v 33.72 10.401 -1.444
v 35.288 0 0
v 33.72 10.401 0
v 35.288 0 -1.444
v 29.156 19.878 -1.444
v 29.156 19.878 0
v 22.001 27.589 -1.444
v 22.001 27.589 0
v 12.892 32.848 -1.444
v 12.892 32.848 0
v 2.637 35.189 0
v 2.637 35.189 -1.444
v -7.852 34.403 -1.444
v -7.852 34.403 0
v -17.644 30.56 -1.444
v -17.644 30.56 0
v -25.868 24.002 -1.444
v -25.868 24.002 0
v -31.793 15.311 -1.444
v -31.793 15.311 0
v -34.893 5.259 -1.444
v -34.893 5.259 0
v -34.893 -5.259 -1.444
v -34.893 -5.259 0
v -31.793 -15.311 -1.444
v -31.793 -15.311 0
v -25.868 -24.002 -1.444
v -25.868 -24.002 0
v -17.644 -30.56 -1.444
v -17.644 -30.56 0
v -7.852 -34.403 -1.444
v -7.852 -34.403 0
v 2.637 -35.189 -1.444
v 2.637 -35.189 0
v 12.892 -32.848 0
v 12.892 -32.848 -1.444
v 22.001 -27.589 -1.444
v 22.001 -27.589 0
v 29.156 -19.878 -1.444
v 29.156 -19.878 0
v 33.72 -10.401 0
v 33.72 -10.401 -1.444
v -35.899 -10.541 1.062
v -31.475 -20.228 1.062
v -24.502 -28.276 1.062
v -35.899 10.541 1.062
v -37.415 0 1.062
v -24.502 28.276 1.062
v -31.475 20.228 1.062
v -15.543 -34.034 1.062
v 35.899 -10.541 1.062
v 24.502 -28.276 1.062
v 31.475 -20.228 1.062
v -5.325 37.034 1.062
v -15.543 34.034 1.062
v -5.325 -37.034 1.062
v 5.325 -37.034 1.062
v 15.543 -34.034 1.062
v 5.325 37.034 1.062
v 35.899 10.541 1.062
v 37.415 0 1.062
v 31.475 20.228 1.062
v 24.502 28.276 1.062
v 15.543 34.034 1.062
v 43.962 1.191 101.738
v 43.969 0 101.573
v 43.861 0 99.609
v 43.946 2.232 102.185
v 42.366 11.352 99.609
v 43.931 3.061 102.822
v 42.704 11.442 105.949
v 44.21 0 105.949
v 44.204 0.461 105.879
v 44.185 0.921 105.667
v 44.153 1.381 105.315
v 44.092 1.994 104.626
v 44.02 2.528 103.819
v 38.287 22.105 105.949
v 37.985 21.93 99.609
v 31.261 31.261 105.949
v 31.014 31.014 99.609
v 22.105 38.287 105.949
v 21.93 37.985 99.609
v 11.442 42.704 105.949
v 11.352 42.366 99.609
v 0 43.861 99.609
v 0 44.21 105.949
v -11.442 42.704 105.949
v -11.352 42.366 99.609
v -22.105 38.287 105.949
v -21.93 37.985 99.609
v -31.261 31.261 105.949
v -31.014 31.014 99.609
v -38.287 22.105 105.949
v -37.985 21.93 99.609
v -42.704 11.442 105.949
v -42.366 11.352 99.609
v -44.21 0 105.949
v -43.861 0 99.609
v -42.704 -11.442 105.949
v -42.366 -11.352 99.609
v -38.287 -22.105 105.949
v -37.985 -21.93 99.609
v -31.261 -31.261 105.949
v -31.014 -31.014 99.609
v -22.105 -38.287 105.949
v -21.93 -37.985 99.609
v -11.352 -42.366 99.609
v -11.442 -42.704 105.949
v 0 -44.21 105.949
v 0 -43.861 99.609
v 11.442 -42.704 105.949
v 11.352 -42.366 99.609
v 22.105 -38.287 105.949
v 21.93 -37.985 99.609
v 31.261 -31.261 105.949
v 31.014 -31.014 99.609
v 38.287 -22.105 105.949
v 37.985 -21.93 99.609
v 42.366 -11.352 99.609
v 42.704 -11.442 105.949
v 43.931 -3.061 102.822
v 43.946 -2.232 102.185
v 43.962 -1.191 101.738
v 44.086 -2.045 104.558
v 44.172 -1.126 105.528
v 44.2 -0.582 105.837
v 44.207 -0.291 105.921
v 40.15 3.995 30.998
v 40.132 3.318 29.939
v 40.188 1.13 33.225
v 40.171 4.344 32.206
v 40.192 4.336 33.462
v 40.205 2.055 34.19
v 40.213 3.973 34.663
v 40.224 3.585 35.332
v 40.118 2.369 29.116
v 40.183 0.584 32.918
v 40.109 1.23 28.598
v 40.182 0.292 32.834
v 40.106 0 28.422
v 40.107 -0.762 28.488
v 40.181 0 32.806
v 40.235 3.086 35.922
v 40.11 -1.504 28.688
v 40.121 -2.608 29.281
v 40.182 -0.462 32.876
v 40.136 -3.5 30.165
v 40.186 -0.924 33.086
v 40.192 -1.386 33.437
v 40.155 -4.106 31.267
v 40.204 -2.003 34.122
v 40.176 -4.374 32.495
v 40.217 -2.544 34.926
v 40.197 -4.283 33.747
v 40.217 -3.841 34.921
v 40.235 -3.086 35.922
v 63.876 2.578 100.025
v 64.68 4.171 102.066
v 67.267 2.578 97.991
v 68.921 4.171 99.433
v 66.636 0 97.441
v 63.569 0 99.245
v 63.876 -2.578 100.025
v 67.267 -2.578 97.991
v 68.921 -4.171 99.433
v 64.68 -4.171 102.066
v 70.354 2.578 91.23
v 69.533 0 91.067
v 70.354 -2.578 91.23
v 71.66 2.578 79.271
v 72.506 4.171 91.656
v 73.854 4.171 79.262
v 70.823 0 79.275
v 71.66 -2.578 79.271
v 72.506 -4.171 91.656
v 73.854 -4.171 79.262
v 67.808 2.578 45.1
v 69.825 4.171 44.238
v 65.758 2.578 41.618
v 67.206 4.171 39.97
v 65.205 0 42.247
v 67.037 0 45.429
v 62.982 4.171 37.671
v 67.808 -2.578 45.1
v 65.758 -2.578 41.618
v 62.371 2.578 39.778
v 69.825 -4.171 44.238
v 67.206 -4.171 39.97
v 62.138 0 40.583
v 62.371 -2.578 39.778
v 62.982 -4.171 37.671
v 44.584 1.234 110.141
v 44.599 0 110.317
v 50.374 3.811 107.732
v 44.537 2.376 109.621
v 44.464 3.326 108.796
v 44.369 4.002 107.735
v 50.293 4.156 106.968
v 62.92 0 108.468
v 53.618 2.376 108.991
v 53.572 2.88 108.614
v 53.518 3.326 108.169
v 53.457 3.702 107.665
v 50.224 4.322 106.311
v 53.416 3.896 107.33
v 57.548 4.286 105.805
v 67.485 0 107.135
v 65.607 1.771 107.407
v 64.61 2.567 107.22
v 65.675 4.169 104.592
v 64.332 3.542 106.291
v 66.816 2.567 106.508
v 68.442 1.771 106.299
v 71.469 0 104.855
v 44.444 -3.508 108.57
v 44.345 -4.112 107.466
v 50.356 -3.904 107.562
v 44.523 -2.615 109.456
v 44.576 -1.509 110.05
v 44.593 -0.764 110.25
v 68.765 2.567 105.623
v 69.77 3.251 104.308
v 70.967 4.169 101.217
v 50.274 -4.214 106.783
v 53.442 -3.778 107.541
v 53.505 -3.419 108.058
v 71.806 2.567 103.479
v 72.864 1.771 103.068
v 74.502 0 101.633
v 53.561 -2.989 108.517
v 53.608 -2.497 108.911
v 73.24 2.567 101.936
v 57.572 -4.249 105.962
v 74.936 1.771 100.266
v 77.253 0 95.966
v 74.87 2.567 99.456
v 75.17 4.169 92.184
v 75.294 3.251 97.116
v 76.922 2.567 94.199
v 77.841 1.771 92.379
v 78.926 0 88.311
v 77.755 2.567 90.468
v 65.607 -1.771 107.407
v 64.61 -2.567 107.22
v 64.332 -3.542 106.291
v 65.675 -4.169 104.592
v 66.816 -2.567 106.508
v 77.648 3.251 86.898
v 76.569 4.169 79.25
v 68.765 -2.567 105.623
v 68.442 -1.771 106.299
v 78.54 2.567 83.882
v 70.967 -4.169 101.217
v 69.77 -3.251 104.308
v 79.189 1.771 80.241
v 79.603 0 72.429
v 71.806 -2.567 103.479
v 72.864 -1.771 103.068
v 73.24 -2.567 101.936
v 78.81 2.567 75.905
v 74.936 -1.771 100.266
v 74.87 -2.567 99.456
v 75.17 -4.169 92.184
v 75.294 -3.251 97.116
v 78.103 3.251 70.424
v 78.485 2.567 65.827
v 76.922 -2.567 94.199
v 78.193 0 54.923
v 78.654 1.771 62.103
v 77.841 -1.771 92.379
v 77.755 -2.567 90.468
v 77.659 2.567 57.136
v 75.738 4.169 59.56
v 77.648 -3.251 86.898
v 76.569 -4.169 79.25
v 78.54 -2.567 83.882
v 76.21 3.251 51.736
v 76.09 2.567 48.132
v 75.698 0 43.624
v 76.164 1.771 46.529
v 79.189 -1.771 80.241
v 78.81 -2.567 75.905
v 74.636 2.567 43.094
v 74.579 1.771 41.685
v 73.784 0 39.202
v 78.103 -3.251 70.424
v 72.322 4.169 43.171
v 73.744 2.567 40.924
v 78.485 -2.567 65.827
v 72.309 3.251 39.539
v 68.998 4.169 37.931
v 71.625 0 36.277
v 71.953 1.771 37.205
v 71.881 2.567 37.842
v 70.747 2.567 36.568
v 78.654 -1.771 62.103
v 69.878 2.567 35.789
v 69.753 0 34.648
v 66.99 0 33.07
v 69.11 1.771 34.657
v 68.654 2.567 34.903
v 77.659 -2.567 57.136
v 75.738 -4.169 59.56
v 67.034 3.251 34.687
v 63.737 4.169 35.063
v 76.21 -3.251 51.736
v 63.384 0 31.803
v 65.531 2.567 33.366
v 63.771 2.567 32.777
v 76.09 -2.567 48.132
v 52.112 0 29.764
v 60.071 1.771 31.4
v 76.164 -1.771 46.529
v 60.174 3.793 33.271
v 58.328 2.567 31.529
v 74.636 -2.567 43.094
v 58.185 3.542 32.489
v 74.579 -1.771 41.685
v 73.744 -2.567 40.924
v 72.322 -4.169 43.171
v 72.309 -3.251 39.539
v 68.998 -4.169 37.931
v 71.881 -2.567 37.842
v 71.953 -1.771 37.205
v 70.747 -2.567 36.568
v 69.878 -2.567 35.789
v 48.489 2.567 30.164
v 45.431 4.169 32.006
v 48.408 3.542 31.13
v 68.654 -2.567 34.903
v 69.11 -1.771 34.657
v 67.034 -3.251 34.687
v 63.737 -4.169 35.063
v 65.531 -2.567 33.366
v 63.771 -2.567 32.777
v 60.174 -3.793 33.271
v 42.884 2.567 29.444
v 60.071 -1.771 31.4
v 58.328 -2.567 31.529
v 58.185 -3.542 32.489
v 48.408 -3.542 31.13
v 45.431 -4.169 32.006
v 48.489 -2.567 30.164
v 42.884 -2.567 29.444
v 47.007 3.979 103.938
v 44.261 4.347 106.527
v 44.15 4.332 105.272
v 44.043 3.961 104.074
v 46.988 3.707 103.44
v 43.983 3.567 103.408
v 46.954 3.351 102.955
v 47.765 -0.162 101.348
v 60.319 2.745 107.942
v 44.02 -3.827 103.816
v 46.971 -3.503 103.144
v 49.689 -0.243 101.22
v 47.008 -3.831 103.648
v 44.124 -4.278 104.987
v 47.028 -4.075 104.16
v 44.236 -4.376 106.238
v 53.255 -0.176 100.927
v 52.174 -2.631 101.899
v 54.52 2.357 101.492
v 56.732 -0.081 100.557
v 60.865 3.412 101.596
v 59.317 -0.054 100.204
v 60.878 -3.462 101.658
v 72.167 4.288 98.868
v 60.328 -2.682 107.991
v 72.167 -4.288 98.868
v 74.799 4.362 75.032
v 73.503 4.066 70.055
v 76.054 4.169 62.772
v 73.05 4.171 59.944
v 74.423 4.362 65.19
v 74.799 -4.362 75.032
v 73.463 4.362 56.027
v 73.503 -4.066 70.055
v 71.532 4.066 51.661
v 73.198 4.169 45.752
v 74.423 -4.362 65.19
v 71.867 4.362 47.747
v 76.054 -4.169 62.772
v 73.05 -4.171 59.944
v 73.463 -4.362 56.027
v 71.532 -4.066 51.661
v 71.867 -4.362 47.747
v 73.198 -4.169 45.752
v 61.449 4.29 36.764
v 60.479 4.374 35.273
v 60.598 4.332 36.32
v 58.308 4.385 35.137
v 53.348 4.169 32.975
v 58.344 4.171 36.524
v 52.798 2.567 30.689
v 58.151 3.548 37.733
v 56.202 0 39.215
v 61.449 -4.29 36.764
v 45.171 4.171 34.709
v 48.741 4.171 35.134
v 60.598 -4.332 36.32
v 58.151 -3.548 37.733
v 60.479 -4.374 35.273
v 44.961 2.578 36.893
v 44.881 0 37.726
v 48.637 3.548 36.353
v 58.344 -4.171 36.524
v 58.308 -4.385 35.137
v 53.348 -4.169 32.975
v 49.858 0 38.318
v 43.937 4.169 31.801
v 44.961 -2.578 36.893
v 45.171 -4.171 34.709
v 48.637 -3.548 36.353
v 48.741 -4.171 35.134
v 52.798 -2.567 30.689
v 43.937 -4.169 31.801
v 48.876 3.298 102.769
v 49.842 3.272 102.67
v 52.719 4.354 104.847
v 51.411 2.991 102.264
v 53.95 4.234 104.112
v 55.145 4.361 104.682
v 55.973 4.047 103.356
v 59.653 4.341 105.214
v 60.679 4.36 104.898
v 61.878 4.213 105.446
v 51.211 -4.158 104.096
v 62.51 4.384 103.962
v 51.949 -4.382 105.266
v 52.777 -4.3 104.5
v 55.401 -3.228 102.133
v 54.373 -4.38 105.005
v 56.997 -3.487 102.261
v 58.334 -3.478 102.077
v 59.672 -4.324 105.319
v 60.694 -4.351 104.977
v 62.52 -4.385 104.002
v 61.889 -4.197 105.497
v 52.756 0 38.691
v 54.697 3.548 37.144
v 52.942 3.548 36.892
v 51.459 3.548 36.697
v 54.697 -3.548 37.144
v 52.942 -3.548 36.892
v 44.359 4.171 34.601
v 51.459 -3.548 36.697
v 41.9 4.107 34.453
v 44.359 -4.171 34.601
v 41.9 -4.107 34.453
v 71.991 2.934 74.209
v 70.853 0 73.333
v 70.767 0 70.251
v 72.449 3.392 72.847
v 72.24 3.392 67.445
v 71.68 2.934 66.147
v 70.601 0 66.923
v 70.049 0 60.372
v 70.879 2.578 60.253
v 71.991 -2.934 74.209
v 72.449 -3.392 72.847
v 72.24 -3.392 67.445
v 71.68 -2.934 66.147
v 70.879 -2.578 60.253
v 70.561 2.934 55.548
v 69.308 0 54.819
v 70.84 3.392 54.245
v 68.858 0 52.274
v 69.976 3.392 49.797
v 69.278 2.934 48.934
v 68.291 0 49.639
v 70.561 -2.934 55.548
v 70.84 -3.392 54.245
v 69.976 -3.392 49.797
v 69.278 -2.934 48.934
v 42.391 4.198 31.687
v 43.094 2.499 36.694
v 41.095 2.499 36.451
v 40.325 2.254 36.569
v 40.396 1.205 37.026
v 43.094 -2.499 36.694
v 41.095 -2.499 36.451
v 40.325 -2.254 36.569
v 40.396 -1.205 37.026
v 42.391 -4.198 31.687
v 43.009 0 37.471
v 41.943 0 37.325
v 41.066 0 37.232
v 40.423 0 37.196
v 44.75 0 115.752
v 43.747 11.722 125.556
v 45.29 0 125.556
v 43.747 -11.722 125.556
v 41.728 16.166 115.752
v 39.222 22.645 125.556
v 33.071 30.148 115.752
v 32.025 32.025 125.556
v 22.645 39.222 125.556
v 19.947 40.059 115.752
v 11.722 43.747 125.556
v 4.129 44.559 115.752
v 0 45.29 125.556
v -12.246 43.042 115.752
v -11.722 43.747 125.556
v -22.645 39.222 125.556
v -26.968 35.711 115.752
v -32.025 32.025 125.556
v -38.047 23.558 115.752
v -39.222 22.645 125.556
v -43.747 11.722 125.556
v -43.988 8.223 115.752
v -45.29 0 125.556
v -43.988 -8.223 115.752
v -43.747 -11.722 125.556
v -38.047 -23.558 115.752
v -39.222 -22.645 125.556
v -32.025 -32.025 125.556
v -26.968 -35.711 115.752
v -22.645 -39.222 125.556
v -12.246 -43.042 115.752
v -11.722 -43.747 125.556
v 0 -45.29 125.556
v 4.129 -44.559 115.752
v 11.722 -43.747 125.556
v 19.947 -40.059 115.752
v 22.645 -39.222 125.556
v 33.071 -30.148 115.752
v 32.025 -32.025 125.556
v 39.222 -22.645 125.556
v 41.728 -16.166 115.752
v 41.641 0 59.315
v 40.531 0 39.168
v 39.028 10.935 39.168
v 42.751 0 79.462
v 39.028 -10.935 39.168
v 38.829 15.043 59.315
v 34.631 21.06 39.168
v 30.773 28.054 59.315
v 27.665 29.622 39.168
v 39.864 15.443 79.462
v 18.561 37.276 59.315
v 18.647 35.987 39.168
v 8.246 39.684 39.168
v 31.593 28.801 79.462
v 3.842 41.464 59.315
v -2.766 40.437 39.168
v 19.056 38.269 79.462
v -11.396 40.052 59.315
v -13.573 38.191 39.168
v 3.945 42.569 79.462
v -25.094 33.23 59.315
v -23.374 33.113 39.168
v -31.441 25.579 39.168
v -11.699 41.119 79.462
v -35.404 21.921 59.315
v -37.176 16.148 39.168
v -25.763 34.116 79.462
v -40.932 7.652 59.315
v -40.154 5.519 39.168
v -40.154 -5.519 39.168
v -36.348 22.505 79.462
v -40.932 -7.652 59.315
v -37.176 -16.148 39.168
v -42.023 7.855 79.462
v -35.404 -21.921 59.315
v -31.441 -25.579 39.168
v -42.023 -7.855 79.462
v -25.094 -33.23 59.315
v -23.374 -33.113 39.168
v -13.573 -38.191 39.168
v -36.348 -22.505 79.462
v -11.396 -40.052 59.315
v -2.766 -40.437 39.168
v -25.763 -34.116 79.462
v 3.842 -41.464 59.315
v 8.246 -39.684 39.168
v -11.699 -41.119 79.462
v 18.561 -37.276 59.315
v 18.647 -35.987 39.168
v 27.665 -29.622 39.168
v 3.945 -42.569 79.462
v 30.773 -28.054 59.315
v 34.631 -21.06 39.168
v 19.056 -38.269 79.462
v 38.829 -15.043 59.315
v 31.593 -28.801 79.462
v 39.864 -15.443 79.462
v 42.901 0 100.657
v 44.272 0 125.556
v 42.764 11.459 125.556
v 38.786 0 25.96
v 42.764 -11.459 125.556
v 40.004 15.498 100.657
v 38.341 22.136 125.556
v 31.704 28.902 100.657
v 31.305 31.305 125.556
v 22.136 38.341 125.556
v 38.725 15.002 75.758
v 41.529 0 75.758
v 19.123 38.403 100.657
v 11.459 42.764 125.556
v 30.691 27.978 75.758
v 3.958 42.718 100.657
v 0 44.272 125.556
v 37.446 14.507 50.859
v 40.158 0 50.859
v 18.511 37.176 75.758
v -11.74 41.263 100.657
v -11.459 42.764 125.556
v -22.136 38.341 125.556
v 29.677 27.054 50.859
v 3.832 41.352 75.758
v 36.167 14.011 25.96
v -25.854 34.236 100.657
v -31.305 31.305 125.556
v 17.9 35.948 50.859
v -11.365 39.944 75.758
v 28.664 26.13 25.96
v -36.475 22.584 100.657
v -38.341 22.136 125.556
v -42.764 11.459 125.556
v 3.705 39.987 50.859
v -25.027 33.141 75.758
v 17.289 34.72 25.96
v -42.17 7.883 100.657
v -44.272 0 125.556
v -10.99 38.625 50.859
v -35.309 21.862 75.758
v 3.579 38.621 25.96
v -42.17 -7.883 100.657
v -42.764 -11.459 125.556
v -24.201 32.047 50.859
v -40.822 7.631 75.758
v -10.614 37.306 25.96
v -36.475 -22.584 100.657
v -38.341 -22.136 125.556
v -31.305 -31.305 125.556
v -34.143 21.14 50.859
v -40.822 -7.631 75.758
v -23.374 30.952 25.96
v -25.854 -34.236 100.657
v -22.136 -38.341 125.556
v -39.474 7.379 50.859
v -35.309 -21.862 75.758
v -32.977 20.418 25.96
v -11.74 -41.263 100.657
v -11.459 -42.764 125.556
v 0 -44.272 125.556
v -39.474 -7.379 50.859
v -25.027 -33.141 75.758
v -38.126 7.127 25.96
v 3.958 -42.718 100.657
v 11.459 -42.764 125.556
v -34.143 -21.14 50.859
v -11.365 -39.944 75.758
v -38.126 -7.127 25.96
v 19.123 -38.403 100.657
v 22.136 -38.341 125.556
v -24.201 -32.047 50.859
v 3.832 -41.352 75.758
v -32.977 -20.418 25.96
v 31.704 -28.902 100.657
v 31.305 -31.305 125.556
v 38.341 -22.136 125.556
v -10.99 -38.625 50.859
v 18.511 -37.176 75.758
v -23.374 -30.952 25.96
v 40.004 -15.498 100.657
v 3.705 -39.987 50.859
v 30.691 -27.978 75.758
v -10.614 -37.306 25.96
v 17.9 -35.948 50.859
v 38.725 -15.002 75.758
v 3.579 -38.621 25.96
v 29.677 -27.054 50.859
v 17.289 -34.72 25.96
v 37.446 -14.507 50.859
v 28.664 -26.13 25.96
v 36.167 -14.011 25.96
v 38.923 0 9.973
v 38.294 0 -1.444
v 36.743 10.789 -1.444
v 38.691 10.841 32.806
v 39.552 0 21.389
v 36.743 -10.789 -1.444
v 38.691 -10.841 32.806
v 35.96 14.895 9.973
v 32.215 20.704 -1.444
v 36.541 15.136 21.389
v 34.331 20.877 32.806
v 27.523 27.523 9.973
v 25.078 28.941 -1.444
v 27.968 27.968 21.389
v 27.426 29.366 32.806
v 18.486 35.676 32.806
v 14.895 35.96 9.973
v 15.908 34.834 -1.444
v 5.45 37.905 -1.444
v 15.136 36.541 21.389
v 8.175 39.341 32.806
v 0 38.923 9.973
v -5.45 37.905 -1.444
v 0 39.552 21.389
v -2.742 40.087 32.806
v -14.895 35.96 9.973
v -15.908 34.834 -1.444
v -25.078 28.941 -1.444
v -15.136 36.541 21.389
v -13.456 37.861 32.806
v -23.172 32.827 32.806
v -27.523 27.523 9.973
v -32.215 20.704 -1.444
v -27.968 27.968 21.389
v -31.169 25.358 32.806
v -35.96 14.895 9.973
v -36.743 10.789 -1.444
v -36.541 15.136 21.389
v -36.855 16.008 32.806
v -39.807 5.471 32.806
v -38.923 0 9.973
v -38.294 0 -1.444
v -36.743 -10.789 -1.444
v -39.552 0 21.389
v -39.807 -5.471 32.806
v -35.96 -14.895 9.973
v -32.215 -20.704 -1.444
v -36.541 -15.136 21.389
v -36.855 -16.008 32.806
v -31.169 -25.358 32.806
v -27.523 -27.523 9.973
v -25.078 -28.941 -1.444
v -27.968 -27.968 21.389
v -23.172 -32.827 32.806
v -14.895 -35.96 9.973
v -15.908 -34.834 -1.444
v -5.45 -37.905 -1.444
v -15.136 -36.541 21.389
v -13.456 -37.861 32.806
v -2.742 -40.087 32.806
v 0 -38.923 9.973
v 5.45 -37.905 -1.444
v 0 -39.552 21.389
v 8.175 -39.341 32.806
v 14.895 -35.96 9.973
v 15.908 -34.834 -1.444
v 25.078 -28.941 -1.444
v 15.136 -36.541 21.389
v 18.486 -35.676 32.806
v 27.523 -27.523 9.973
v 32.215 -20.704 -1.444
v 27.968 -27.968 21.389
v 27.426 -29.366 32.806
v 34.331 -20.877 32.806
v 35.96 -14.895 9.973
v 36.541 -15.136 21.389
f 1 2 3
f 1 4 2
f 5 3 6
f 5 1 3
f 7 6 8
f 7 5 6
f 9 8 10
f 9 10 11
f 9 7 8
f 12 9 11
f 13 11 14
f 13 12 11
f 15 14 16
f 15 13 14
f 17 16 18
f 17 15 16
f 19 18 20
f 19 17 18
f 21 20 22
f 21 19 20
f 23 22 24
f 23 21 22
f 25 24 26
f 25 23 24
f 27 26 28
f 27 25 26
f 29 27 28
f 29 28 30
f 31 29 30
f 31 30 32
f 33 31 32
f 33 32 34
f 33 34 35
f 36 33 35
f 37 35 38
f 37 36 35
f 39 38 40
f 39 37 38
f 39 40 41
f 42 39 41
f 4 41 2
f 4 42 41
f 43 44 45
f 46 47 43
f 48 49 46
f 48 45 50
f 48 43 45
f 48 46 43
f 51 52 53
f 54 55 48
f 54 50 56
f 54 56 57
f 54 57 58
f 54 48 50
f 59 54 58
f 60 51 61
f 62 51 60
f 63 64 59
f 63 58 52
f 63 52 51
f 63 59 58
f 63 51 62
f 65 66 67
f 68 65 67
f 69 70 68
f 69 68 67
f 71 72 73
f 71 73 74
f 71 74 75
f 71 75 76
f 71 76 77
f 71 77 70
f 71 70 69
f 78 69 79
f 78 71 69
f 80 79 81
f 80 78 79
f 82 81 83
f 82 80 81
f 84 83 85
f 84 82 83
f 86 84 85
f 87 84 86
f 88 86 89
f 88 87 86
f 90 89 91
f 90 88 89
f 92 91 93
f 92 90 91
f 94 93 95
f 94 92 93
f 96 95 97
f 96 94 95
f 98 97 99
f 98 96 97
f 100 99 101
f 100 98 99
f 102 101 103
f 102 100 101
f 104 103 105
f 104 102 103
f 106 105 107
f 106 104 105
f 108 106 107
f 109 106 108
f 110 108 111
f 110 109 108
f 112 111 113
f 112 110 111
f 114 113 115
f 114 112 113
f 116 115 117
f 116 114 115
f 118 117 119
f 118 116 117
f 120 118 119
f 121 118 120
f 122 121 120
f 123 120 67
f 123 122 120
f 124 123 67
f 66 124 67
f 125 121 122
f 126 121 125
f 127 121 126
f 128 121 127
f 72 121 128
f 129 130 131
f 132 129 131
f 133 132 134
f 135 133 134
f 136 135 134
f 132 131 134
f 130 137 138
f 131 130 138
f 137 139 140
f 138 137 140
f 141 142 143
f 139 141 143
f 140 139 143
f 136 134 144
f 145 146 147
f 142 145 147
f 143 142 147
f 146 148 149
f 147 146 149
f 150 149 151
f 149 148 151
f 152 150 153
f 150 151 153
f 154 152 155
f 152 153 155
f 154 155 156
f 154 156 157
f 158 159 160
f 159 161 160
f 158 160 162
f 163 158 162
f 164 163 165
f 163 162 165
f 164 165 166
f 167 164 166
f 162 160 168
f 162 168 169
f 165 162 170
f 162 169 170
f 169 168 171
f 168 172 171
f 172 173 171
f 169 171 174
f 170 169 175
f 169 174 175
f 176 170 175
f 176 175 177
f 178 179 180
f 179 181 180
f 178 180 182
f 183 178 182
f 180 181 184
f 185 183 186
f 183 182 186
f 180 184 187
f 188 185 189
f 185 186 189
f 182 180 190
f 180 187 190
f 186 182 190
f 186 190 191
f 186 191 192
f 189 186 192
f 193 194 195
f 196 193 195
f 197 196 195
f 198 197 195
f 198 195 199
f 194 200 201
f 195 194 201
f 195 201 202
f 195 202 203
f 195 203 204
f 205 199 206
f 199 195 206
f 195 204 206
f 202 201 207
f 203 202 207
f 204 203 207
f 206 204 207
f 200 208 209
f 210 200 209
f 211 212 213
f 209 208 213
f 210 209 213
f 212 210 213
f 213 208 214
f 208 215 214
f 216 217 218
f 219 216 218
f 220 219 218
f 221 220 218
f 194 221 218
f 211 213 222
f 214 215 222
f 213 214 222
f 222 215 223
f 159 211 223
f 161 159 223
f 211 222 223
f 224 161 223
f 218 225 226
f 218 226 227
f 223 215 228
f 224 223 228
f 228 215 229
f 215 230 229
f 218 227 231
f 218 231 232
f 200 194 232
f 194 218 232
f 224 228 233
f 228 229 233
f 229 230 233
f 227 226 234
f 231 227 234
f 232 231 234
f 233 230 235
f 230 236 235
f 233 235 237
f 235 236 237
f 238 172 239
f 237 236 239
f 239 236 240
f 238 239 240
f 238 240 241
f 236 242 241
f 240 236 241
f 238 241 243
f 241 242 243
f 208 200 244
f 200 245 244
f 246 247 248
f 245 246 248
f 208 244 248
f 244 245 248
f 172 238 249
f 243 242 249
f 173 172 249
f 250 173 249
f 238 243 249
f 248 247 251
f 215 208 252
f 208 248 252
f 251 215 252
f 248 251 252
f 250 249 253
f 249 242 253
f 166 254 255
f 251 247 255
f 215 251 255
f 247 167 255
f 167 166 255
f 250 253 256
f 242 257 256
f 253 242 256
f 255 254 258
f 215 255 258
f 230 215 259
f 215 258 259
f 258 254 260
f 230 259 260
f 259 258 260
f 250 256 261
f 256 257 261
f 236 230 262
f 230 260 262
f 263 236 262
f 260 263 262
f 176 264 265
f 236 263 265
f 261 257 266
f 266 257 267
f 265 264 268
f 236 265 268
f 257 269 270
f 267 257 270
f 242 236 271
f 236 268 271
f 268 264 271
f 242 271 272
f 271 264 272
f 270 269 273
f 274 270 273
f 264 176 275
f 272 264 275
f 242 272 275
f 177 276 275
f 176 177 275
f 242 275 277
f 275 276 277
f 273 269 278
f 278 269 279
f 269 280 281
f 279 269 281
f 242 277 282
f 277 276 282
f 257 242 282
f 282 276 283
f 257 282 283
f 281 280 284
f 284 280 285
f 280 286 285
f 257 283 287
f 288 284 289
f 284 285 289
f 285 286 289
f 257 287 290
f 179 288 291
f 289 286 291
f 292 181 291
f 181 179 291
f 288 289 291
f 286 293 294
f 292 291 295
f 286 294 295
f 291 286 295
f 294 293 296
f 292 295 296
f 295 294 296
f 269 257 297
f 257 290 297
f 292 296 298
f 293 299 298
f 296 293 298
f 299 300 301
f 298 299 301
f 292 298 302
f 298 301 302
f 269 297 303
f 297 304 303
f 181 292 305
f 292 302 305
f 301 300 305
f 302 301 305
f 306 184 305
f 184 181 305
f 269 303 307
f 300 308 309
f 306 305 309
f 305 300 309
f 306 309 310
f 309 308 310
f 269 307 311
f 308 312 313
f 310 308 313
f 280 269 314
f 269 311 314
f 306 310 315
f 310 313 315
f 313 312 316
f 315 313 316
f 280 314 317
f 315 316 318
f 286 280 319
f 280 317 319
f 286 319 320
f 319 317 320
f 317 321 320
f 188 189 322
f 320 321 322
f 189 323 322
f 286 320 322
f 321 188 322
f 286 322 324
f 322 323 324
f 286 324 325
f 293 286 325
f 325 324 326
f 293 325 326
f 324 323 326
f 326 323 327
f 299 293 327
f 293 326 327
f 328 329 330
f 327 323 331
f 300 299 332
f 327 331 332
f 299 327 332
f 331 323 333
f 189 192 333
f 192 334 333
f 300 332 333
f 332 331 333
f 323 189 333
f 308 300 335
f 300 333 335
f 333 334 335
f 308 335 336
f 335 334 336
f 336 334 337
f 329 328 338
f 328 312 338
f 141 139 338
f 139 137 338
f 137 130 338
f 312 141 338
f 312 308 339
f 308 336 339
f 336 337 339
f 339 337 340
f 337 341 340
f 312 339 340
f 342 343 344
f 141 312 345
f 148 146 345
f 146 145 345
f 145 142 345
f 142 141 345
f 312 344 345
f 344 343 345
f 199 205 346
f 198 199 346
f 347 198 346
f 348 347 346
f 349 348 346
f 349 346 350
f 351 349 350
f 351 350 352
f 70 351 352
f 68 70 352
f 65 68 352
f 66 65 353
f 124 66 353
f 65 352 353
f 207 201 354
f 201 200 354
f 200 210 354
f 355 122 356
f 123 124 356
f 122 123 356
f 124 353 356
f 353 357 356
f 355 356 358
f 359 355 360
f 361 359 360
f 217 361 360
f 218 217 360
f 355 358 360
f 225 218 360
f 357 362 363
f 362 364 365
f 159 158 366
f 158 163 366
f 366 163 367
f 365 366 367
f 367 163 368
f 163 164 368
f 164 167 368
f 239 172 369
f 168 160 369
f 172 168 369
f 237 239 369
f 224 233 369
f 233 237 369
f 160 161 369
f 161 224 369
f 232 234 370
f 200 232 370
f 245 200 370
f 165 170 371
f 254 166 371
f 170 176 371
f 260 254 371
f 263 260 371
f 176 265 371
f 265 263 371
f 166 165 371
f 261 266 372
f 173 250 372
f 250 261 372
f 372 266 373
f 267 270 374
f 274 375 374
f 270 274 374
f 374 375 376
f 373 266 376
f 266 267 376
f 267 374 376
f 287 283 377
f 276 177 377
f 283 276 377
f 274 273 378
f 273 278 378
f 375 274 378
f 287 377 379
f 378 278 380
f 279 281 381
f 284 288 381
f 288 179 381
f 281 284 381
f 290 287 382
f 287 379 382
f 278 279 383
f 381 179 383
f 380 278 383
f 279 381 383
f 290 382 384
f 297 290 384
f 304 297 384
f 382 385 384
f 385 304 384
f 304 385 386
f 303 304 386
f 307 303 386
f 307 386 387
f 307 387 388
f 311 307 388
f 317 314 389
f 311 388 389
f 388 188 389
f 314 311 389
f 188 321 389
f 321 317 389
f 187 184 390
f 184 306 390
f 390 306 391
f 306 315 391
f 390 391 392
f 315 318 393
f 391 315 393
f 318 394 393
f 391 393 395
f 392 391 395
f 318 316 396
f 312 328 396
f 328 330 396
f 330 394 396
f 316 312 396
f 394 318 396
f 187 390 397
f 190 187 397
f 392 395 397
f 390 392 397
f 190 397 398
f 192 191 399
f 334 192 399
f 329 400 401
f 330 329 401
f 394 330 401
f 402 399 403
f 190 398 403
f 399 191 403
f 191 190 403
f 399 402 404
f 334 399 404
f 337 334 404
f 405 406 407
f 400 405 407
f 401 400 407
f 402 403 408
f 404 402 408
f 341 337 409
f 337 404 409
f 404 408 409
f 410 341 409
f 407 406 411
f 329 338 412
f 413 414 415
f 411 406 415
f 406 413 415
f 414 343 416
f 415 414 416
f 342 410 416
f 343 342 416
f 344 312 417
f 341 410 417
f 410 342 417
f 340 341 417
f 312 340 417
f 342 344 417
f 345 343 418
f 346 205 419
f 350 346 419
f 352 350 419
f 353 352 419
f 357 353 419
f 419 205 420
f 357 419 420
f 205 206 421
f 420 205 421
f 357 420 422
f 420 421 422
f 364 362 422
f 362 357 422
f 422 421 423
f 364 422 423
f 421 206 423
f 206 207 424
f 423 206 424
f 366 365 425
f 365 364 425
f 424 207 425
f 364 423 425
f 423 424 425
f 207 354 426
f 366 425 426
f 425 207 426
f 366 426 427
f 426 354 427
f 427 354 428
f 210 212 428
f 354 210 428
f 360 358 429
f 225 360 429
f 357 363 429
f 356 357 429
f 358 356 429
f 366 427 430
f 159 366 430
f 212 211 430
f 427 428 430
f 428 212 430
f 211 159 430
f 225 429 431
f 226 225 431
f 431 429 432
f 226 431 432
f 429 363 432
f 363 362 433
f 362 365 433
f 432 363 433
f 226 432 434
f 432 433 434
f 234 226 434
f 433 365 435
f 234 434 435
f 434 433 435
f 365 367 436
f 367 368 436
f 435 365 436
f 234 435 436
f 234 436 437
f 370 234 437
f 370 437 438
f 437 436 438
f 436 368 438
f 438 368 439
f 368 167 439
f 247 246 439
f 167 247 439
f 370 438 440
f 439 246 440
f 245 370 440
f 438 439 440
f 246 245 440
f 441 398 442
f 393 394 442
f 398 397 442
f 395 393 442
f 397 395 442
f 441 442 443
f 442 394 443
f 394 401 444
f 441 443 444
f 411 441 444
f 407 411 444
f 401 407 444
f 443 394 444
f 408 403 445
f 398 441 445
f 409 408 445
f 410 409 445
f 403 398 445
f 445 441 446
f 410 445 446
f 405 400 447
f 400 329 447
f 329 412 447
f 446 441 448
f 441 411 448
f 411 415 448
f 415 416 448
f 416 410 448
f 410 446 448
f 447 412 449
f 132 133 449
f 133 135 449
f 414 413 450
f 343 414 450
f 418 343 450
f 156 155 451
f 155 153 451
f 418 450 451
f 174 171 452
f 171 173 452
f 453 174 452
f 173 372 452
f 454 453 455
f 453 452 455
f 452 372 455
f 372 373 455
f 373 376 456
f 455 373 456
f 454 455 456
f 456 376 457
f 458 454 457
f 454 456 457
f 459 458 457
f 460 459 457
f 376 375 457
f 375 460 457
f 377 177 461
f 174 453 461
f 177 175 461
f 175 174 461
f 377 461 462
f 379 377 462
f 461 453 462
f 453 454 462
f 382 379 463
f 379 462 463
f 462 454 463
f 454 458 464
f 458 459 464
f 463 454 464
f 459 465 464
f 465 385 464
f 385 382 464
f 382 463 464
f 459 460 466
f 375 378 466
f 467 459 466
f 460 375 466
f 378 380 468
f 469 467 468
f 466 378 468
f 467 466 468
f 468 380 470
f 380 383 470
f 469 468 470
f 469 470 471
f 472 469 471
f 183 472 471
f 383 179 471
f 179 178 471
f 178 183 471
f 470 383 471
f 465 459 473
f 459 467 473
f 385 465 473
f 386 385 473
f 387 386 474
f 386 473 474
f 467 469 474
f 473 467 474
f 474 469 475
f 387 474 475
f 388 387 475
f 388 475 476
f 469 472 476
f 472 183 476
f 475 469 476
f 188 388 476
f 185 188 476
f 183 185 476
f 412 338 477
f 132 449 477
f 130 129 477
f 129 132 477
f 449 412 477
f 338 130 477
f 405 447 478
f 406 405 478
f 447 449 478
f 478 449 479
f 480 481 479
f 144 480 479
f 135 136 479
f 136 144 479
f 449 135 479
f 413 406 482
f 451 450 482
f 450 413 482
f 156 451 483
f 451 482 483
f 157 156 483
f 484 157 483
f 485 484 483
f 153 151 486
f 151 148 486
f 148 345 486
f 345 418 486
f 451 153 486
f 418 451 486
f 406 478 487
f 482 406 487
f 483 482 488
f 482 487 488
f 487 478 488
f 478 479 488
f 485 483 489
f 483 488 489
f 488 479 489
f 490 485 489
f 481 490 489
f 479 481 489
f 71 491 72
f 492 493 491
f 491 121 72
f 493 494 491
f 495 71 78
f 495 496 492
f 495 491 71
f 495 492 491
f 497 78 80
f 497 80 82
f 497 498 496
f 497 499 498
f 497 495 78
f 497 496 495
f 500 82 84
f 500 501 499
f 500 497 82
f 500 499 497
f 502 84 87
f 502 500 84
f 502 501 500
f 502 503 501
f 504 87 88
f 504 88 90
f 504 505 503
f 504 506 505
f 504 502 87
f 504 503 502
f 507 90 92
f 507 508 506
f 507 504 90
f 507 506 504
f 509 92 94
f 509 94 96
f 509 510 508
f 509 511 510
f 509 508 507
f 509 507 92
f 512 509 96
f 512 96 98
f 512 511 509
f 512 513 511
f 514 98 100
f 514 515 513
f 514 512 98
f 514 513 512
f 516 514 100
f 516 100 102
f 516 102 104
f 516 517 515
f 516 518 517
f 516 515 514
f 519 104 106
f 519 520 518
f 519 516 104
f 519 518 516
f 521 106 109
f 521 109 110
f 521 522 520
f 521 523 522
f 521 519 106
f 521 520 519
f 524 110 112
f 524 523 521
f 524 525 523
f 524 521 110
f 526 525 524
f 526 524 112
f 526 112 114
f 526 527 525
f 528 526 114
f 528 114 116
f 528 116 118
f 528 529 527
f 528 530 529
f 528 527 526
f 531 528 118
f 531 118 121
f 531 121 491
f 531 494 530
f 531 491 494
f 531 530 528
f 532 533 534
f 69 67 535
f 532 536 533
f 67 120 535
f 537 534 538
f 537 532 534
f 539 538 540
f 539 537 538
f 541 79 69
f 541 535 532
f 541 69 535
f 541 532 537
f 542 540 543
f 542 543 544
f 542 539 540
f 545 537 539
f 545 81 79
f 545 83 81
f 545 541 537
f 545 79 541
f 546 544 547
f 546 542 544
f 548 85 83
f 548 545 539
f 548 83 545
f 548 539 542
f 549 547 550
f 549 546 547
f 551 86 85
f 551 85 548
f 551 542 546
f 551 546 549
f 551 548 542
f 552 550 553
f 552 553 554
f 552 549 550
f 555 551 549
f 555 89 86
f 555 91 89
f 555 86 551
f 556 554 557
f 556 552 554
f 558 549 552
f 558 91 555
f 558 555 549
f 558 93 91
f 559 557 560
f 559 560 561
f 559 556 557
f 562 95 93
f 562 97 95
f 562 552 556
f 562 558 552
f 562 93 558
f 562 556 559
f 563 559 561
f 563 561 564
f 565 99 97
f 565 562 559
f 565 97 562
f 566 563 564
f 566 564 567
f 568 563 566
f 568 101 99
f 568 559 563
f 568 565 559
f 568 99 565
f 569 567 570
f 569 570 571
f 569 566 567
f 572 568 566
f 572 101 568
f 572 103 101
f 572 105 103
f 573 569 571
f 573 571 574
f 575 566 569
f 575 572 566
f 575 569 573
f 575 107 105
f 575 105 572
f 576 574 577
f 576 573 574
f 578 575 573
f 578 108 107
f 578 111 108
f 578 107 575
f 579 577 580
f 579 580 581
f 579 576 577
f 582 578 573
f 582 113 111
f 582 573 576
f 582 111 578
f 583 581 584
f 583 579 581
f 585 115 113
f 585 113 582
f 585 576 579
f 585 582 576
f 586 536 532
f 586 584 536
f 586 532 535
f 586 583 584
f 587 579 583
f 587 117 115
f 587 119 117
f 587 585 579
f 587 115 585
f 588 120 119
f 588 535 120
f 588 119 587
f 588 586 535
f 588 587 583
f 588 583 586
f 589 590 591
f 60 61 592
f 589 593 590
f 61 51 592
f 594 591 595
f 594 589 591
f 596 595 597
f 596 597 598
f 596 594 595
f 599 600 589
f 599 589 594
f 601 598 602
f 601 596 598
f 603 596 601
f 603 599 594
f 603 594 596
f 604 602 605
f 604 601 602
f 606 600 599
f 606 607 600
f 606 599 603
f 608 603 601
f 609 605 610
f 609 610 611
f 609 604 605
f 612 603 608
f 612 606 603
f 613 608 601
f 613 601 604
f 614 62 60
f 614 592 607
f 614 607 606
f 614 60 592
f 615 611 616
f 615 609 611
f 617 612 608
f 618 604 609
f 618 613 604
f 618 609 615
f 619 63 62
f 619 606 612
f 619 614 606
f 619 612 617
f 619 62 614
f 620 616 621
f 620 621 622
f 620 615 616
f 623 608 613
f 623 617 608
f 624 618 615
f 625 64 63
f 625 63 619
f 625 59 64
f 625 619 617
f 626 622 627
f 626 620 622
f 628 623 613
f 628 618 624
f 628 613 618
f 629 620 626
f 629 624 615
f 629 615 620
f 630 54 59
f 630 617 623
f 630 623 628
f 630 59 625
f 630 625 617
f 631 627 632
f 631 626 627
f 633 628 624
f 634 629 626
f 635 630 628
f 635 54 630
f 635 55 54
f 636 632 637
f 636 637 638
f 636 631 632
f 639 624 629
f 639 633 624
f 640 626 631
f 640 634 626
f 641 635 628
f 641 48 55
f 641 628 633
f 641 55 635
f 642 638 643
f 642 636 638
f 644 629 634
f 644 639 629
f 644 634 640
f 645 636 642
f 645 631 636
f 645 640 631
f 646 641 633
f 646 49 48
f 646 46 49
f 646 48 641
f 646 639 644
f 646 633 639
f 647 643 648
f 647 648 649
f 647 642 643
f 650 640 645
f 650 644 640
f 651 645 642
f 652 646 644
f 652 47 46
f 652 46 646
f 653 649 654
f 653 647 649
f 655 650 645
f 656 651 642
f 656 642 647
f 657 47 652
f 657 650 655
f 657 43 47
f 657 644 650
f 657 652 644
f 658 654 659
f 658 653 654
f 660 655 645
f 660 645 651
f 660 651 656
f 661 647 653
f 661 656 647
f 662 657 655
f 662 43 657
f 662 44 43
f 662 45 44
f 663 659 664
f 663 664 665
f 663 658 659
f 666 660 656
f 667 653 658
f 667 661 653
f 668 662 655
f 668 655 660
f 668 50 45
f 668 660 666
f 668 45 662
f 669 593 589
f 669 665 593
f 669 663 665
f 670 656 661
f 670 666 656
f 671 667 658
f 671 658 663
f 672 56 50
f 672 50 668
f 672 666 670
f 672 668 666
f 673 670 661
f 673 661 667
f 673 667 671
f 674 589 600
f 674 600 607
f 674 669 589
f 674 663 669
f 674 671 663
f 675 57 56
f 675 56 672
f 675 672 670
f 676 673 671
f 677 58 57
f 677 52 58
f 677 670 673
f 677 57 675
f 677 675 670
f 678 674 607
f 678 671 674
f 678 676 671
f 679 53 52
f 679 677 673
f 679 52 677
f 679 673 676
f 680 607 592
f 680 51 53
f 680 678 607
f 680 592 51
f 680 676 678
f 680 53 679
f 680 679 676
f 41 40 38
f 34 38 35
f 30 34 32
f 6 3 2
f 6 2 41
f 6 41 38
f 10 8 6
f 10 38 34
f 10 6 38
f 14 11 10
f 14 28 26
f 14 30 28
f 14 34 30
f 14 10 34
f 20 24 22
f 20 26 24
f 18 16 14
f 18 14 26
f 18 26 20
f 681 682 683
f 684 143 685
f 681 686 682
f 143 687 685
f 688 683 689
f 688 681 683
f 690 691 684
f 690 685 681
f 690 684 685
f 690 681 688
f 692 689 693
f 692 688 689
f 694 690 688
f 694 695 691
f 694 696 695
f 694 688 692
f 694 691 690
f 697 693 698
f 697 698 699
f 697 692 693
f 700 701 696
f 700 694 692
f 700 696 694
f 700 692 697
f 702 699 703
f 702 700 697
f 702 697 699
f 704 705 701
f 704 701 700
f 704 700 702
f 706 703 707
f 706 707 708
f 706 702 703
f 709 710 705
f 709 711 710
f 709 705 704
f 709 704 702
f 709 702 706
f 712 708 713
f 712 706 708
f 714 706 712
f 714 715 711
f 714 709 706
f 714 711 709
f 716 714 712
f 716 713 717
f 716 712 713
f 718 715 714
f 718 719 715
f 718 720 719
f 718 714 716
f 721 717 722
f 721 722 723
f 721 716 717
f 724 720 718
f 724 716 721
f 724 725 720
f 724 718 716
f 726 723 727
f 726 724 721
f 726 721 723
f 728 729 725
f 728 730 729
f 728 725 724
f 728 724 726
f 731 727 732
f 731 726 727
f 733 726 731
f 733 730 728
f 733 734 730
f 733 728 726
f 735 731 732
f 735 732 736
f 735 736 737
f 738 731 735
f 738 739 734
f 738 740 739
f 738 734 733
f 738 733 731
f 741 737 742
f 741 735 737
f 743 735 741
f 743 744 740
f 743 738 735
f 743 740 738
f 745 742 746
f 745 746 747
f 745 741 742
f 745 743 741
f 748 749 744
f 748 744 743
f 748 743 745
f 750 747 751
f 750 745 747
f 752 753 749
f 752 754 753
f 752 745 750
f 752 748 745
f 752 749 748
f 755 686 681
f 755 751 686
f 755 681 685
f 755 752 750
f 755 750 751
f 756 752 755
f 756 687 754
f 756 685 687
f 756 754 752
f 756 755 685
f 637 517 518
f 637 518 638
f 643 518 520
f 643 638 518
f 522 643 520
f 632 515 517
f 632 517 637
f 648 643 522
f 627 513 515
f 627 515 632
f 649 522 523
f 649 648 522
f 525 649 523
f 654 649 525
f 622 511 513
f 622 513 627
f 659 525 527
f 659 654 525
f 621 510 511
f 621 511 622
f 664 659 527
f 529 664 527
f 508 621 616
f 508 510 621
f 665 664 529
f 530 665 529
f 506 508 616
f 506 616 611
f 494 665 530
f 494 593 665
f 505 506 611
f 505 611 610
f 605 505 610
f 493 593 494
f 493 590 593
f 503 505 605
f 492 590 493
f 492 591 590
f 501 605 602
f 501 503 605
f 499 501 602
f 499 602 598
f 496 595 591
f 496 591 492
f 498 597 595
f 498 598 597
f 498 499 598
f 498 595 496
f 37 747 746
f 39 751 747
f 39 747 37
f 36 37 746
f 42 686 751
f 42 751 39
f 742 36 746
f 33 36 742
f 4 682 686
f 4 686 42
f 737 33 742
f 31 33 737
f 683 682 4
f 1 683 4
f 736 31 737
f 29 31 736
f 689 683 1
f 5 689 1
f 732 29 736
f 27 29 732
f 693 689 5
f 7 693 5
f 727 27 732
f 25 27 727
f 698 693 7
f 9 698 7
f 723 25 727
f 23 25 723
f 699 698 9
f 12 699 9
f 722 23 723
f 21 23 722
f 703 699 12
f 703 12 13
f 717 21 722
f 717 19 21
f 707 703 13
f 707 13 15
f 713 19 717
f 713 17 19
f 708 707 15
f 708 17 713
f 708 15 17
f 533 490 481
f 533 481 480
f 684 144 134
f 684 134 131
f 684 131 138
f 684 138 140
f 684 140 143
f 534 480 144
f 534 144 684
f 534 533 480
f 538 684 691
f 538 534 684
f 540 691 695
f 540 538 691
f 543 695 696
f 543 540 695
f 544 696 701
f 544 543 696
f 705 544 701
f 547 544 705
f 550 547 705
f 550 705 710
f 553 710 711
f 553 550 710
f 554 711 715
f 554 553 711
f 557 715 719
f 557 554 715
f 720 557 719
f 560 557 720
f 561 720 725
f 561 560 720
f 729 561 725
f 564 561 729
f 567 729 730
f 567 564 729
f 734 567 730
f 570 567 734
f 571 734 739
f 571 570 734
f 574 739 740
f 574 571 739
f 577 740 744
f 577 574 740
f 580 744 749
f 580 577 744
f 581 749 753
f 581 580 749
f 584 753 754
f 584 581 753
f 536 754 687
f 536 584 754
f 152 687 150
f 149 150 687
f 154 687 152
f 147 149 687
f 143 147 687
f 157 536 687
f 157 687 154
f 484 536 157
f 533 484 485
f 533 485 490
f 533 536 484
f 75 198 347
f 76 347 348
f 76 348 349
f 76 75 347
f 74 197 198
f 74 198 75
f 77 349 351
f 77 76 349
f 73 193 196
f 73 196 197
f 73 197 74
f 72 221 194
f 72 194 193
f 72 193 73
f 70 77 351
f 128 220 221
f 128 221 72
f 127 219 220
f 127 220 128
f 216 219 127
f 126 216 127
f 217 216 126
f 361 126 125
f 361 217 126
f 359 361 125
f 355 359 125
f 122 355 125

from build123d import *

# Parameters (mm, degrees)
F3_R = 4.3853298938


with BuildPart() as f1:
    # F0 (on Front) → F1 (revolve)
    with BuildSketch(Plane.XZ):
        Polygon((44.2099806775, 105.9490938586), (45.2899709793, 125.555711587), (44.2724308081, 125.555711587), (37.4149333342, 1.0616940765), (0, 1.0616940765), (0, 0), (35.287540406, 0), (35.287540406, -1.444288413), (38.2944366026, -1.444288413), (40.1810593803, 32.8062891499), (40.531485917, 39.1680862292), (43.8607326026, 99.6086910919), align=None)
    revolve(axis=Axis((0, 0, 69.7766542435), (0, 0, 1)))

    # F4: sweep along a path in F0
    with BuildLine(Plane.XZ) as f4_path:
        add(Plane.XZ * Edge.make_bspline(
            [(44.2099806775, 105.9490938586), (49.0506904174, 105.6739127968), (59.0645866106, 105.0457021821), (72.5638000505, 101.964100219), (76.7064605297, 79.0873827338), (73.2562446897, 42.9019377278), (64.6212325948, 35.2456056894), (45.068033657, 33.5123230208), (41.9423858857, 32.8326484411), (40.1810593803, 32.8062891499)],
            knots=[0, 0, 0, 0, 0.139953431, 0.2625513152, 0.4305704465, 0.6462751927, 0.7639065202, 0.9181752612, 1, 1, 1, 1], degree=3))
    # F3 (on offset) → F4 (sweep)
    with BuildSketch(Plane.XY.offset(79.756)):
        with Locations((75.1930936536, 0)):
            Circle(F3_R)
    sweep(path=f4_path.line)


solid = f1.part
